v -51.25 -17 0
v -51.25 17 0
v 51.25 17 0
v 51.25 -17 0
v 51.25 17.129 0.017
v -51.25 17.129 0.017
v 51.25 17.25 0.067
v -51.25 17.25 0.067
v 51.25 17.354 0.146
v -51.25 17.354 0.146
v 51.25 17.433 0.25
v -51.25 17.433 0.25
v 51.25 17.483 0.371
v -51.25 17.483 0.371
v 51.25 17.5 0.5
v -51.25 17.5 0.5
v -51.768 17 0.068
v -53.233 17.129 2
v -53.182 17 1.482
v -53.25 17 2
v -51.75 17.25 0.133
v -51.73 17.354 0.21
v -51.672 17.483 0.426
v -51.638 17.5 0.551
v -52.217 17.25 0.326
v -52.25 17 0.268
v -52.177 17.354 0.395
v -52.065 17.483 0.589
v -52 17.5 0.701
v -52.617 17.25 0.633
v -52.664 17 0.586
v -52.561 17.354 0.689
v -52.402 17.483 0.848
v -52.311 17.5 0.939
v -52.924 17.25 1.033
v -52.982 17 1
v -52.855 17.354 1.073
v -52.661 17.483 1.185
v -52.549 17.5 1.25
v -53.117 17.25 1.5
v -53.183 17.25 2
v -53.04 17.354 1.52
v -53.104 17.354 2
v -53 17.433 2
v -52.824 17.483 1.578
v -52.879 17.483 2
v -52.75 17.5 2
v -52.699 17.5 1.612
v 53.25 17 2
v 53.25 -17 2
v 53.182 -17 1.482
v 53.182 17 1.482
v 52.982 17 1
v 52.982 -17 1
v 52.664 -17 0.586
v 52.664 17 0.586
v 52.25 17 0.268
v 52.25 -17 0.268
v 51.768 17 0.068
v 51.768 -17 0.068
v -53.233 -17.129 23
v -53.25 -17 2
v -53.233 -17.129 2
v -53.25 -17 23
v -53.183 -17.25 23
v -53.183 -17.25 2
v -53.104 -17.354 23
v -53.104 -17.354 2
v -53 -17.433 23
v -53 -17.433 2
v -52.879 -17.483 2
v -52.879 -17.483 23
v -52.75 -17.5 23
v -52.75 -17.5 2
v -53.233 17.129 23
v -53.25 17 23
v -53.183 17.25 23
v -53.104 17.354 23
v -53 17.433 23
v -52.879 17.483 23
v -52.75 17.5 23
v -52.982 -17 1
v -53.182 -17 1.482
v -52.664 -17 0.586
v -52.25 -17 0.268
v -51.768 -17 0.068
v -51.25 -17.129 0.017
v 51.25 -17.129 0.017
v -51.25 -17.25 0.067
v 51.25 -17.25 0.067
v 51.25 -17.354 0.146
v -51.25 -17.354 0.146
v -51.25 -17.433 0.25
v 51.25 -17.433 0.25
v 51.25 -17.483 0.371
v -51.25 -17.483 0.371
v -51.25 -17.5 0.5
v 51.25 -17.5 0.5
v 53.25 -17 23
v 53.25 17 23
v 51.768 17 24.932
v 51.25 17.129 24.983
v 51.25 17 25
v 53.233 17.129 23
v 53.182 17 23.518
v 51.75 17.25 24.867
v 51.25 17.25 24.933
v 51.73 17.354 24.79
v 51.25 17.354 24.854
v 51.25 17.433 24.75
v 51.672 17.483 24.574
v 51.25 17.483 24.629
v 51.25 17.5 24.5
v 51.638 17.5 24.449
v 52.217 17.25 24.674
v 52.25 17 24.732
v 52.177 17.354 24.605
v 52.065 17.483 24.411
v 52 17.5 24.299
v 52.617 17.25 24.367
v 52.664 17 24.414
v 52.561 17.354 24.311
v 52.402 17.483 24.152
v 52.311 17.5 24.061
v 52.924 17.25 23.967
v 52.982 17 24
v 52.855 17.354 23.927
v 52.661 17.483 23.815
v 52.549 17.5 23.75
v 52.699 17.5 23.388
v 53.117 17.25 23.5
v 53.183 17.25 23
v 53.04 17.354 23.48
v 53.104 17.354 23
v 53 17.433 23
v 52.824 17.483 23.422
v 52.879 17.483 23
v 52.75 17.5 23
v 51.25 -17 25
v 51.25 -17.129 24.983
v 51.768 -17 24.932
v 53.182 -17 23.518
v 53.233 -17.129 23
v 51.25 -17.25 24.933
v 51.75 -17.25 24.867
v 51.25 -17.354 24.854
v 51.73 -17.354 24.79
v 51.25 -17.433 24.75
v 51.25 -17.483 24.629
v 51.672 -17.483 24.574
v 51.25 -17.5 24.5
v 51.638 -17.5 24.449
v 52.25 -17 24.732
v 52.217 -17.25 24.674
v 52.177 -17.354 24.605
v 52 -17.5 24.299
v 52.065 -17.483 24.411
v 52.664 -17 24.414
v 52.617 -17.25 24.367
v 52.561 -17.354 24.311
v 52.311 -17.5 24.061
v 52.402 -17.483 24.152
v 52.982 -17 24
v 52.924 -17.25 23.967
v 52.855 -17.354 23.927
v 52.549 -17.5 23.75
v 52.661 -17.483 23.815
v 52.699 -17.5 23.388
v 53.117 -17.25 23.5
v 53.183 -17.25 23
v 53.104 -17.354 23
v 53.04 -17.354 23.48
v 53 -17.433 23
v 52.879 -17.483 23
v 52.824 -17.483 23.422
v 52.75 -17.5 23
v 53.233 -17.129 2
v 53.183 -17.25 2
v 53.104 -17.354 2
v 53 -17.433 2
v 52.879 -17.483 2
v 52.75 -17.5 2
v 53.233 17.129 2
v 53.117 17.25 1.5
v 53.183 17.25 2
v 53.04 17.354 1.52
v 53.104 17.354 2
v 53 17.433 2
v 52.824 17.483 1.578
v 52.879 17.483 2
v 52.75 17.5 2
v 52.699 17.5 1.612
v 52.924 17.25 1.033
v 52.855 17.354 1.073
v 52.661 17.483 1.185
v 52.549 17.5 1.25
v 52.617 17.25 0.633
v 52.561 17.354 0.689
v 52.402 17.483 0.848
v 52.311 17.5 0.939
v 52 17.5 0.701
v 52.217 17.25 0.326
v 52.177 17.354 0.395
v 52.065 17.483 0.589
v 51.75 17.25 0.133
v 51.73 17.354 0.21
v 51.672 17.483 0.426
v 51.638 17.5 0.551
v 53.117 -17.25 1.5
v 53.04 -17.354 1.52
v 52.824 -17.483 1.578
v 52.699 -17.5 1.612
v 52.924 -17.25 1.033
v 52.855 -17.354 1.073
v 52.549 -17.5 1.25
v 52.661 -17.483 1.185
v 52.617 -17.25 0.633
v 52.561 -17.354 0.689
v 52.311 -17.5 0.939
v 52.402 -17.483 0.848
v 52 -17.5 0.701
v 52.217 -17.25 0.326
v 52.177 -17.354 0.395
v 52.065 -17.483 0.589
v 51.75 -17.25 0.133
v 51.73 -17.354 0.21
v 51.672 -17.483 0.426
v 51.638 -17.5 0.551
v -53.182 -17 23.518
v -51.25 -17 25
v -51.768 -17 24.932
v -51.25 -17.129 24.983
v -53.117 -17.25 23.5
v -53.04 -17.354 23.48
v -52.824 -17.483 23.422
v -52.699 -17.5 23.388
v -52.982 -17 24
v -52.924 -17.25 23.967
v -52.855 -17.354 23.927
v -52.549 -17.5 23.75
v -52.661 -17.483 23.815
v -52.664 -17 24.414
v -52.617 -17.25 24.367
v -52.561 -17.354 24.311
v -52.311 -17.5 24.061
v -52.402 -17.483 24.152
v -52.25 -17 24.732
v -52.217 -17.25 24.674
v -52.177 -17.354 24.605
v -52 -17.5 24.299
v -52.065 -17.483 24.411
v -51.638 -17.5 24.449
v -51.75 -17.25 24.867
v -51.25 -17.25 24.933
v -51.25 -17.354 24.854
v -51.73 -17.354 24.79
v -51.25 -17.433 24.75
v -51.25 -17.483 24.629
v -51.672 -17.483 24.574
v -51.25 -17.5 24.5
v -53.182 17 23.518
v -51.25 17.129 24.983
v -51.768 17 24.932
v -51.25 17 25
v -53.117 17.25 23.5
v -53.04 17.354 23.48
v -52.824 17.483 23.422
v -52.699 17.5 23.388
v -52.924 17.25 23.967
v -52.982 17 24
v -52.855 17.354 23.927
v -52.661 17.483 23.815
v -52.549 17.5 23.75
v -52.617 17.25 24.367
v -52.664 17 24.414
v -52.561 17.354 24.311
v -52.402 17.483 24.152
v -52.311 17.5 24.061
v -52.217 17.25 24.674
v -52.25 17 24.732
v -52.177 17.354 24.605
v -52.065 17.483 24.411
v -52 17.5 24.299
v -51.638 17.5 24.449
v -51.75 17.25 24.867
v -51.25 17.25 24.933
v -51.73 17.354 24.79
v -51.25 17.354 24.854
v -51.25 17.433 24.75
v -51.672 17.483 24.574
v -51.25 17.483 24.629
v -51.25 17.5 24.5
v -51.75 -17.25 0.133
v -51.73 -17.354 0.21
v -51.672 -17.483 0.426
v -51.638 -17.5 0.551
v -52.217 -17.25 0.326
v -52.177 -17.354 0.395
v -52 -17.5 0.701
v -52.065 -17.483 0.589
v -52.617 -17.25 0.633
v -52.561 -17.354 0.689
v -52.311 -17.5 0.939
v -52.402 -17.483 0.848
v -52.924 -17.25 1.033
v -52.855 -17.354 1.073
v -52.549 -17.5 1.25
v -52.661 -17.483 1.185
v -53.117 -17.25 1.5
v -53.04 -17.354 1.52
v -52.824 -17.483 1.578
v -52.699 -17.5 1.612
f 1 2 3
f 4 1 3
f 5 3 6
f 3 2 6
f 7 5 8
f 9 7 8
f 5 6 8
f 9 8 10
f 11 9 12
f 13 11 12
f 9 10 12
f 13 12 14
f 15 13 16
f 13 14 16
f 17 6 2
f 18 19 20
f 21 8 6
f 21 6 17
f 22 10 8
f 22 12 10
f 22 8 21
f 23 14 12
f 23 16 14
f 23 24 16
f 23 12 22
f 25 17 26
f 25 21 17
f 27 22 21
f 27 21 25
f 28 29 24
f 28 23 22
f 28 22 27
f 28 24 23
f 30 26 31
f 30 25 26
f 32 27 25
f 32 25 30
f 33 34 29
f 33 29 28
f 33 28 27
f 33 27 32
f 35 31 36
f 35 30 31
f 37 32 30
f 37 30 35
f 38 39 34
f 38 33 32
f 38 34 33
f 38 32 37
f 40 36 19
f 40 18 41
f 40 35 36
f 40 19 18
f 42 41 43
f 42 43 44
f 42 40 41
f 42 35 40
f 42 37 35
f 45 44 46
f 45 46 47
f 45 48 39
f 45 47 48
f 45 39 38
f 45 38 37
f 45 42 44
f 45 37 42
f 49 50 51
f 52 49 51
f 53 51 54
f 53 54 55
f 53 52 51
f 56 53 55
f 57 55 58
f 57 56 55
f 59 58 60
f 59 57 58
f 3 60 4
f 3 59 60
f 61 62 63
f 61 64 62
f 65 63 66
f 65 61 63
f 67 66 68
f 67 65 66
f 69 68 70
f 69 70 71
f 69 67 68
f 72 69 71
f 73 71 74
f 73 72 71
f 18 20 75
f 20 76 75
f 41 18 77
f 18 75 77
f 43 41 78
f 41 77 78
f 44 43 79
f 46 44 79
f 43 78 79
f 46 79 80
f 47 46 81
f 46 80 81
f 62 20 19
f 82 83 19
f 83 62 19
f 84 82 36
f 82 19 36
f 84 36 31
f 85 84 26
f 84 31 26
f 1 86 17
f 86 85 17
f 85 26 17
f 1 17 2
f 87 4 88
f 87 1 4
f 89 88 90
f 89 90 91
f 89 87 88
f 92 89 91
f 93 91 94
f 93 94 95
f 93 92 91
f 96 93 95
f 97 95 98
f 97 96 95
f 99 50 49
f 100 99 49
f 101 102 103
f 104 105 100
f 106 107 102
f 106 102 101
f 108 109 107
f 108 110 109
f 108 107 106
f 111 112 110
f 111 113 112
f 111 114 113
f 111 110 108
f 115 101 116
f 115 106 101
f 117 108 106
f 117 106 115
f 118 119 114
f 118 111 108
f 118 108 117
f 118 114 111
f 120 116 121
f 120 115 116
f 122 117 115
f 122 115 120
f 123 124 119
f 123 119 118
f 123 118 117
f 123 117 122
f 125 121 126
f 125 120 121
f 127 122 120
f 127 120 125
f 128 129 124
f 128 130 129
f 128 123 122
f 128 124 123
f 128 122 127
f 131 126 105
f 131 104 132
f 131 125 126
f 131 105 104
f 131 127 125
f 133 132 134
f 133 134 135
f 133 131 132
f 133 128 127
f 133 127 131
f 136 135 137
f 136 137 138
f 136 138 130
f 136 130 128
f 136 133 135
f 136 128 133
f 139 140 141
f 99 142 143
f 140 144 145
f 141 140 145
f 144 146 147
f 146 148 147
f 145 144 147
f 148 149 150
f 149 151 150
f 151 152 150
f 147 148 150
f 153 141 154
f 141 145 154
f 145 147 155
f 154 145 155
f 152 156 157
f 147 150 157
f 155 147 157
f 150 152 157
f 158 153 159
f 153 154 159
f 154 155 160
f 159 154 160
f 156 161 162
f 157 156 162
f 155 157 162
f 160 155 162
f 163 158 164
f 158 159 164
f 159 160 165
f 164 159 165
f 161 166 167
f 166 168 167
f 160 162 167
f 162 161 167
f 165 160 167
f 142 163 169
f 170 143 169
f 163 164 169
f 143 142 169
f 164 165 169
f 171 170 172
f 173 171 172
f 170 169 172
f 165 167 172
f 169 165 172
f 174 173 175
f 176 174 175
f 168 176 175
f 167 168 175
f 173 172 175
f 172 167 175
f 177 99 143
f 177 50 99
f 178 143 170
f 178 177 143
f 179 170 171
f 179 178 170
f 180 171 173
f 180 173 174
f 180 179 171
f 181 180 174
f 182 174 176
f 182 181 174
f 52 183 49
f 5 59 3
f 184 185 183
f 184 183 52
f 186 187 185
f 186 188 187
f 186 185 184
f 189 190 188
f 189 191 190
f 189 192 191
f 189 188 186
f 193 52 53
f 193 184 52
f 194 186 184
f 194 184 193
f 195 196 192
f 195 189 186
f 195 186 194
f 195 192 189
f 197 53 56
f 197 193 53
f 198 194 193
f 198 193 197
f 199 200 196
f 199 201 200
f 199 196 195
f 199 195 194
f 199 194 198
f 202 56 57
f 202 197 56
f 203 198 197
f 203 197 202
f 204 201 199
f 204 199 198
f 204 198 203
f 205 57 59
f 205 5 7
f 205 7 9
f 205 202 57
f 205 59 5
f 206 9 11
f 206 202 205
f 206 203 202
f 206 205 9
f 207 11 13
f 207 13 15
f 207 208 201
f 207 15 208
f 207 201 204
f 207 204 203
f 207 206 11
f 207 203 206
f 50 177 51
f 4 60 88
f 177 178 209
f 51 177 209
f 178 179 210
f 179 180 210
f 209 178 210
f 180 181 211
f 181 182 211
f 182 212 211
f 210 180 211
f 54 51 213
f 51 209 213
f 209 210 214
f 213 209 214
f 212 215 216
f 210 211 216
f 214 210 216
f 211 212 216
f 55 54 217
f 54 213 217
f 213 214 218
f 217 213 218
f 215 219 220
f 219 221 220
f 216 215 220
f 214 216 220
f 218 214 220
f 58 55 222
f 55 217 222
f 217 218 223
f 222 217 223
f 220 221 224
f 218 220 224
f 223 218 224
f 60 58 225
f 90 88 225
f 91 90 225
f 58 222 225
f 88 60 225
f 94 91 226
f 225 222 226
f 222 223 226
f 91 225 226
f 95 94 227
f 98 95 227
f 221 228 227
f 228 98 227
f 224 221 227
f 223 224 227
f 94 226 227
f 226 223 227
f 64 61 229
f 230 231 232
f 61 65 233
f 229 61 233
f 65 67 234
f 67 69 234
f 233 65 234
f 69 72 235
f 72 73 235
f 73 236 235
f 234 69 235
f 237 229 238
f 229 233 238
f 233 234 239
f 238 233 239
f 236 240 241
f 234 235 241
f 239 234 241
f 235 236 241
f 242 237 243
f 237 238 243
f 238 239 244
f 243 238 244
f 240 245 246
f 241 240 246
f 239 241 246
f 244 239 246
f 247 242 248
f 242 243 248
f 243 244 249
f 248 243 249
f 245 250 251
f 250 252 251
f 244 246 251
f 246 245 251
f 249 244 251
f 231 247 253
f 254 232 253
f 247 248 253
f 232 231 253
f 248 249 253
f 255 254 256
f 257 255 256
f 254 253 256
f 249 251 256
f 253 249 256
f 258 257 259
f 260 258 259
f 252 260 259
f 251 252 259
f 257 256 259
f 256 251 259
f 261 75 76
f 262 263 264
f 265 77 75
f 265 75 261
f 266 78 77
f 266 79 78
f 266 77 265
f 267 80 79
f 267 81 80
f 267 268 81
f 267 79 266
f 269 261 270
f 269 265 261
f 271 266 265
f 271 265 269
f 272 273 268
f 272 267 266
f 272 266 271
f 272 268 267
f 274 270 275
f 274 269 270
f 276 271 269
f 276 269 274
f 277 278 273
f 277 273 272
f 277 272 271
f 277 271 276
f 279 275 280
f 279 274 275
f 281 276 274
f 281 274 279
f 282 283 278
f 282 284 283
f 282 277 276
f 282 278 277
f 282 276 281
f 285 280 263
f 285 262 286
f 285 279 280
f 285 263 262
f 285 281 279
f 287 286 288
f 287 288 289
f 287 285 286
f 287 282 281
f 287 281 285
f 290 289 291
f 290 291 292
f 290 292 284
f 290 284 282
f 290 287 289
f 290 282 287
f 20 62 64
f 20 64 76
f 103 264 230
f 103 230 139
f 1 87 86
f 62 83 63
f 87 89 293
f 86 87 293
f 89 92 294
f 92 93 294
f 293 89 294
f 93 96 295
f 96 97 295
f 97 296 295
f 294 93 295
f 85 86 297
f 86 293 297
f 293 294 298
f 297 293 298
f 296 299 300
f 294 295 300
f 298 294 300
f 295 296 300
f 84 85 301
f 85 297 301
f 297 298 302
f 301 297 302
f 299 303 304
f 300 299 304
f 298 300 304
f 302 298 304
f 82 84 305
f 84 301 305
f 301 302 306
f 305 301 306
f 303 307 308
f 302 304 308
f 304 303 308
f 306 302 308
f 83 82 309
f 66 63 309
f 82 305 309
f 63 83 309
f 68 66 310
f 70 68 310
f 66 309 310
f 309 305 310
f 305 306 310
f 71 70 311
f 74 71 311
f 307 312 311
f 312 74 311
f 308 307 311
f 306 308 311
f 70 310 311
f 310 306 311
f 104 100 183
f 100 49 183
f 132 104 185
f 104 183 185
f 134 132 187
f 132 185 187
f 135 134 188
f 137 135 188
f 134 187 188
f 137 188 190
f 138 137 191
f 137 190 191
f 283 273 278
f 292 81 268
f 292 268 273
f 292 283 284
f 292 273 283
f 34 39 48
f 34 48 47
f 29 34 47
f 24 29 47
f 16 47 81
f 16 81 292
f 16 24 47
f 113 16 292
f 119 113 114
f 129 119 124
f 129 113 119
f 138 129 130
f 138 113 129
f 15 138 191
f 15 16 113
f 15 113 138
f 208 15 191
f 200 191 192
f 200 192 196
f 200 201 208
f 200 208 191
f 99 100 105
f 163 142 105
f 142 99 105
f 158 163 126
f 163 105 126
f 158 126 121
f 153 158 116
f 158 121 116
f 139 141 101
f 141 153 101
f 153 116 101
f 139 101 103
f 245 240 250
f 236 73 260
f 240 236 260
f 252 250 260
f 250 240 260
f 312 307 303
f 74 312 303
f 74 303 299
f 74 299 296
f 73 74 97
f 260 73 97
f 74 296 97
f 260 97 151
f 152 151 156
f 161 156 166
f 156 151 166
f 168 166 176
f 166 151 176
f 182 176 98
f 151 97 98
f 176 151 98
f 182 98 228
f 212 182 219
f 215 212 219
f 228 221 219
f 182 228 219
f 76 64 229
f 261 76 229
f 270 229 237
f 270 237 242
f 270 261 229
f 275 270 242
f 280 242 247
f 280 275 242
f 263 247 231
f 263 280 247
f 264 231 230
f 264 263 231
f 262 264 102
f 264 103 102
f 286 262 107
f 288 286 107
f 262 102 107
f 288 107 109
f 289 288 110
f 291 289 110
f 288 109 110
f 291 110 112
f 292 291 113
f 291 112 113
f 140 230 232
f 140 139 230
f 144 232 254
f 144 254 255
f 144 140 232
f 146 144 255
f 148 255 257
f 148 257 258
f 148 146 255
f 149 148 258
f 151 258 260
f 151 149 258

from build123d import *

# Parameters (mm, degrees)
SKETCH1_W           = 106.5
SKETCH1_H           = 35
BOSS_EXTRUDE1_DEPTH = 25
FILLET1_R           = 2
FILLET2_R           = 0.5


with BuildPart() as part:
    # Sketch1 → Boss-Extrude1 (new body)
    with BuildSketch(Plane.XY):
        Rectangle(SKETCH1_W, SKETCH1_H)
    extrude(amount=BOSS_EXTRUDE1_DEPTH)

    # Fillet1
    fillet1_edges = [part.edges().sort_by_distance(p)[0] for p in [
        (-53.25, 0, 25),
        (53.25, 0, 25),
        (-53.25, 0, 0),
        (53.25, 0, 0),
    ]]
    fillet(fillet1_edges, radius=FILLET1_R)

    # Fillet2
    fillet2_edges = [part.edges().sort_by_distance(p)[0] for p in [
        (-53.25, -17.5, 12.5),
        (-53.25, 17.5, 12.5),
        (0, -17.5, 0),
        (53.25, -17.5, 12.5),
        (0, -17.5, 25),
        (52.664213562, -17.5, 0.585786438),
        (52.664213562, -17.5, 24.414213562),
        (-52.664213562, -17.5, 24.414213562),
        (-52.664213562, -17.5, 0.585786438),
        (0, 17.5, 0),
        (0, 17.5, 25),
        (53.25, 17.5, 12.5),
        (52.664213562, 17.5, 0.585786438),
        (52.664213562, 17.5, 24.414213562),
        (-52.664213562, 17.5, 24.414213562),
        (-52.664213562, 17.5, 0.585786438),
    ]]
    fillet(fillet2_edges, radius=FILLET2_R)


solid = part.part
